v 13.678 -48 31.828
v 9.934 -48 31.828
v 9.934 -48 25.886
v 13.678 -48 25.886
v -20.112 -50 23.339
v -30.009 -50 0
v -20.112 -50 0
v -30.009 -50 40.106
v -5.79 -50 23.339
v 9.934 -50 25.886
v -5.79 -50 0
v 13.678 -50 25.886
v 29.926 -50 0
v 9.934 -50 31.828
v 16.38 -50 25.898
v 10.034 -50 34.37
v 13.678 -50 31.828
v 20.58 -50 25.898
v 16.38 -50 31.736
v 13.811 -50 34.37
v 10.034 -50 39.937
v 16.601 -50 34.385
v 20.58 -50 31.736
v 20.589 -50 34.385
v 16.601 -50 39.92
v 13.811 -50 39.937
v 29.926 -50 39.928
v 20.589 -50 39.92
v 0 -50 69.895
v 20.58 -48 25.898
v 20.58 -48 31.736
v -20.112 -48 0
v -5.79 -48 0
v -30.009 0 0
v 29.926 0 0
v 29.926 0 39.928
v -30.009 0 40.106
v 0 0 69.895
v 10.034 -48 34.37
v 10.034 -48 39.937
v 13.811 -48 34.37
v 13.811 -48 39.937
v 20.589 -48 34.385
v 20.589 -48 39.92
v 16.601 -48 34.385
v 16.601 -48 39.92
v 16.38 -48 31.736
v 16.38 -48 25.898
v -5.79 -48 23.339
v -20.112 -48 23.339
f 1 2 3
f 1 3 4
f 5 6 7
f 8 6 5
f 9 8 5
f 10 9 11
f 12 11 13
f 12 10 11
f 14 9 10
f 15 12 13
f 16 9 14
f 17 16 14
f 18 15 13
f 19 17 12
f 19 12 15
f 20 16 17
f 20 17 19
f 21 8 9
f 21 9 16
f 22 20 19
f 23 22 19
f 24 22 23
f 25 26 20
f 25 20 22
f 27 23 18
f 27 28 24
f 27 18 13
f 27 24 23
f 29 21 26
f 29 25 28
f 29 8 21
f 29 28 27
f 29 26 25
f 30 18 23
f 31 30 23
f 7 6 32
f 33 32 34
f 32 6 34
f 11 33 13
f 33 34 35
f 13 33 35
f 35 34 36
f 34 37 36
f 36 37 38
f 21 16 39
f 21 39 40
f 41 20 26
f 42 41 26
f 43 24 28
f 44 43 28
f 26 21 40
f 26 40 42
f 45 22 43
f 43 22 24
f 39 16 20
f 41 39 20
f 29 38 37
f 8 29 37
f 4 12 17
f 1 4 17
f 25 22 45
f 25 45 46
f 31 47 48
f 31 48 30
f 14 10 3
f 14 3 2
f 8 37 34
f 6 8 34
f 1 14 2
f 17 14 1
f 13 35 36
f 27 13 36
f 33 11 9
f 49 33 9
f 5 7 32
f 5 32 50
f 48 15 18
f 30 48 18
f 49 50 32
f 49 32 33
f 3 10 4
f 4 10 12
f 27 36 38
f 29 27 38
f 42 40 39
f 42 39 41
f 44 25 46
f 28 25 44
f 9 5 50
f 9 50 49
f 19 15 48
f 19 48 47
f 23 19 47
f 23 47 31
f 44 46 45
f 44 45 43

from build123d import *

# Parameters (mm, degrees)
PAD_DEPTH            = 50
SKETCH001_W          = 14.321759
SKETCH001_H          = 23.338661
POCKET_DEPTH         = 2
SKETCH004_W          = 3.777545
SKETCH004_H          = 5.566906
POCKET001_DEPTH      = 2
SKETCH005_W          = 3.988077
SKETCH005_H          = 5.534469
POCKET002_DEPTH      = 2
SKETCH006_W          = 3.743909
SKETCH006_H          = 5.941416
POCKET003_DEPTH      = 2
SKETCH007_W          = 4.200878
SKETCH007_H          = 5.837583
POCKET004_DEPTH      = 2
BODY_PLACEMENT_ANGLE = 90


with BuildPart() as part:
    # Sketch → Pad (new body)
    with BuildSketch(Plane.XY):
        Polygon((-30.008501, 0), (29.925684, 0), (29.925684, 39.928391), (0, 69.895485), (-30.008501, 40.105713), align=None)
    extrude(amount=PAD_DEPTH)

    # Sketch001 (on Face7 of Pad) → Pocket (cut)
    with BuildSketch(Plane.XY.offset(50)):
        with Locations((-12.951147, 11.66933)):
            Rectangle(SKETCH001_W, SKETCH001_H)
    extrude(amount=-POCKET_DEPTH, mode=Mode.SUBTRACT)

    # Sketch004 (on Face4 of Pocket) → Pocket001 (cut)
    with BuildSketch(Plane.XY.offset(50)):
        with Locations((11.92271, 37.153109)):
            Rectangle(SKETCH004_W, SKETCH004_H)
    extrude(amount=-POCKET001_DEPTH, mode=Mode.SUBTRACT)

    # Sketch005 (on Face4 of Pocket001) → Pocket002 (cut)
    with BuildSketch(Plane.XY.offset(50)):
        with Locations((18.594975, 37.152287)):
            Rectangle(SKETCH005_W, SKETCH005_H)
    extrude(amount=-POCKET002_DEPTH, mode=Mode.SUBTRACT)

    # Sketch006 (on Face4 of Pocket002) → Pocket003 (cut)
    with BuildSketch(Plane.XY.offset(50)):
        with Locations((11.805747, 28.857034)):
            Rectangle(SKETCH006_W, SKETCH006_H)
    extrude(amount=-POCKET003_DEPTH, mode=Mode.SUBTRACT)

    # Sketch007 (on Face4 of Pocket003) → Pocket004 (cut)
    with BuildSketch(Plane.XY.offset(50)):
        with Locations((18.480049, 28.816772)):
            Rectangle(SKETCH007_W, SKETCH007_H)
    extrude(amount=-POCKET004_DEPTH, mode=Mode.SUBTRACT)


with BuildPart() as part_1:
    # Body placement: moved
    add(part.part.rotate(Axis((0, 0, 0), (1, 0, 0)), BODY_PLACEMENT_ANGLE))


solid = part_1.part
